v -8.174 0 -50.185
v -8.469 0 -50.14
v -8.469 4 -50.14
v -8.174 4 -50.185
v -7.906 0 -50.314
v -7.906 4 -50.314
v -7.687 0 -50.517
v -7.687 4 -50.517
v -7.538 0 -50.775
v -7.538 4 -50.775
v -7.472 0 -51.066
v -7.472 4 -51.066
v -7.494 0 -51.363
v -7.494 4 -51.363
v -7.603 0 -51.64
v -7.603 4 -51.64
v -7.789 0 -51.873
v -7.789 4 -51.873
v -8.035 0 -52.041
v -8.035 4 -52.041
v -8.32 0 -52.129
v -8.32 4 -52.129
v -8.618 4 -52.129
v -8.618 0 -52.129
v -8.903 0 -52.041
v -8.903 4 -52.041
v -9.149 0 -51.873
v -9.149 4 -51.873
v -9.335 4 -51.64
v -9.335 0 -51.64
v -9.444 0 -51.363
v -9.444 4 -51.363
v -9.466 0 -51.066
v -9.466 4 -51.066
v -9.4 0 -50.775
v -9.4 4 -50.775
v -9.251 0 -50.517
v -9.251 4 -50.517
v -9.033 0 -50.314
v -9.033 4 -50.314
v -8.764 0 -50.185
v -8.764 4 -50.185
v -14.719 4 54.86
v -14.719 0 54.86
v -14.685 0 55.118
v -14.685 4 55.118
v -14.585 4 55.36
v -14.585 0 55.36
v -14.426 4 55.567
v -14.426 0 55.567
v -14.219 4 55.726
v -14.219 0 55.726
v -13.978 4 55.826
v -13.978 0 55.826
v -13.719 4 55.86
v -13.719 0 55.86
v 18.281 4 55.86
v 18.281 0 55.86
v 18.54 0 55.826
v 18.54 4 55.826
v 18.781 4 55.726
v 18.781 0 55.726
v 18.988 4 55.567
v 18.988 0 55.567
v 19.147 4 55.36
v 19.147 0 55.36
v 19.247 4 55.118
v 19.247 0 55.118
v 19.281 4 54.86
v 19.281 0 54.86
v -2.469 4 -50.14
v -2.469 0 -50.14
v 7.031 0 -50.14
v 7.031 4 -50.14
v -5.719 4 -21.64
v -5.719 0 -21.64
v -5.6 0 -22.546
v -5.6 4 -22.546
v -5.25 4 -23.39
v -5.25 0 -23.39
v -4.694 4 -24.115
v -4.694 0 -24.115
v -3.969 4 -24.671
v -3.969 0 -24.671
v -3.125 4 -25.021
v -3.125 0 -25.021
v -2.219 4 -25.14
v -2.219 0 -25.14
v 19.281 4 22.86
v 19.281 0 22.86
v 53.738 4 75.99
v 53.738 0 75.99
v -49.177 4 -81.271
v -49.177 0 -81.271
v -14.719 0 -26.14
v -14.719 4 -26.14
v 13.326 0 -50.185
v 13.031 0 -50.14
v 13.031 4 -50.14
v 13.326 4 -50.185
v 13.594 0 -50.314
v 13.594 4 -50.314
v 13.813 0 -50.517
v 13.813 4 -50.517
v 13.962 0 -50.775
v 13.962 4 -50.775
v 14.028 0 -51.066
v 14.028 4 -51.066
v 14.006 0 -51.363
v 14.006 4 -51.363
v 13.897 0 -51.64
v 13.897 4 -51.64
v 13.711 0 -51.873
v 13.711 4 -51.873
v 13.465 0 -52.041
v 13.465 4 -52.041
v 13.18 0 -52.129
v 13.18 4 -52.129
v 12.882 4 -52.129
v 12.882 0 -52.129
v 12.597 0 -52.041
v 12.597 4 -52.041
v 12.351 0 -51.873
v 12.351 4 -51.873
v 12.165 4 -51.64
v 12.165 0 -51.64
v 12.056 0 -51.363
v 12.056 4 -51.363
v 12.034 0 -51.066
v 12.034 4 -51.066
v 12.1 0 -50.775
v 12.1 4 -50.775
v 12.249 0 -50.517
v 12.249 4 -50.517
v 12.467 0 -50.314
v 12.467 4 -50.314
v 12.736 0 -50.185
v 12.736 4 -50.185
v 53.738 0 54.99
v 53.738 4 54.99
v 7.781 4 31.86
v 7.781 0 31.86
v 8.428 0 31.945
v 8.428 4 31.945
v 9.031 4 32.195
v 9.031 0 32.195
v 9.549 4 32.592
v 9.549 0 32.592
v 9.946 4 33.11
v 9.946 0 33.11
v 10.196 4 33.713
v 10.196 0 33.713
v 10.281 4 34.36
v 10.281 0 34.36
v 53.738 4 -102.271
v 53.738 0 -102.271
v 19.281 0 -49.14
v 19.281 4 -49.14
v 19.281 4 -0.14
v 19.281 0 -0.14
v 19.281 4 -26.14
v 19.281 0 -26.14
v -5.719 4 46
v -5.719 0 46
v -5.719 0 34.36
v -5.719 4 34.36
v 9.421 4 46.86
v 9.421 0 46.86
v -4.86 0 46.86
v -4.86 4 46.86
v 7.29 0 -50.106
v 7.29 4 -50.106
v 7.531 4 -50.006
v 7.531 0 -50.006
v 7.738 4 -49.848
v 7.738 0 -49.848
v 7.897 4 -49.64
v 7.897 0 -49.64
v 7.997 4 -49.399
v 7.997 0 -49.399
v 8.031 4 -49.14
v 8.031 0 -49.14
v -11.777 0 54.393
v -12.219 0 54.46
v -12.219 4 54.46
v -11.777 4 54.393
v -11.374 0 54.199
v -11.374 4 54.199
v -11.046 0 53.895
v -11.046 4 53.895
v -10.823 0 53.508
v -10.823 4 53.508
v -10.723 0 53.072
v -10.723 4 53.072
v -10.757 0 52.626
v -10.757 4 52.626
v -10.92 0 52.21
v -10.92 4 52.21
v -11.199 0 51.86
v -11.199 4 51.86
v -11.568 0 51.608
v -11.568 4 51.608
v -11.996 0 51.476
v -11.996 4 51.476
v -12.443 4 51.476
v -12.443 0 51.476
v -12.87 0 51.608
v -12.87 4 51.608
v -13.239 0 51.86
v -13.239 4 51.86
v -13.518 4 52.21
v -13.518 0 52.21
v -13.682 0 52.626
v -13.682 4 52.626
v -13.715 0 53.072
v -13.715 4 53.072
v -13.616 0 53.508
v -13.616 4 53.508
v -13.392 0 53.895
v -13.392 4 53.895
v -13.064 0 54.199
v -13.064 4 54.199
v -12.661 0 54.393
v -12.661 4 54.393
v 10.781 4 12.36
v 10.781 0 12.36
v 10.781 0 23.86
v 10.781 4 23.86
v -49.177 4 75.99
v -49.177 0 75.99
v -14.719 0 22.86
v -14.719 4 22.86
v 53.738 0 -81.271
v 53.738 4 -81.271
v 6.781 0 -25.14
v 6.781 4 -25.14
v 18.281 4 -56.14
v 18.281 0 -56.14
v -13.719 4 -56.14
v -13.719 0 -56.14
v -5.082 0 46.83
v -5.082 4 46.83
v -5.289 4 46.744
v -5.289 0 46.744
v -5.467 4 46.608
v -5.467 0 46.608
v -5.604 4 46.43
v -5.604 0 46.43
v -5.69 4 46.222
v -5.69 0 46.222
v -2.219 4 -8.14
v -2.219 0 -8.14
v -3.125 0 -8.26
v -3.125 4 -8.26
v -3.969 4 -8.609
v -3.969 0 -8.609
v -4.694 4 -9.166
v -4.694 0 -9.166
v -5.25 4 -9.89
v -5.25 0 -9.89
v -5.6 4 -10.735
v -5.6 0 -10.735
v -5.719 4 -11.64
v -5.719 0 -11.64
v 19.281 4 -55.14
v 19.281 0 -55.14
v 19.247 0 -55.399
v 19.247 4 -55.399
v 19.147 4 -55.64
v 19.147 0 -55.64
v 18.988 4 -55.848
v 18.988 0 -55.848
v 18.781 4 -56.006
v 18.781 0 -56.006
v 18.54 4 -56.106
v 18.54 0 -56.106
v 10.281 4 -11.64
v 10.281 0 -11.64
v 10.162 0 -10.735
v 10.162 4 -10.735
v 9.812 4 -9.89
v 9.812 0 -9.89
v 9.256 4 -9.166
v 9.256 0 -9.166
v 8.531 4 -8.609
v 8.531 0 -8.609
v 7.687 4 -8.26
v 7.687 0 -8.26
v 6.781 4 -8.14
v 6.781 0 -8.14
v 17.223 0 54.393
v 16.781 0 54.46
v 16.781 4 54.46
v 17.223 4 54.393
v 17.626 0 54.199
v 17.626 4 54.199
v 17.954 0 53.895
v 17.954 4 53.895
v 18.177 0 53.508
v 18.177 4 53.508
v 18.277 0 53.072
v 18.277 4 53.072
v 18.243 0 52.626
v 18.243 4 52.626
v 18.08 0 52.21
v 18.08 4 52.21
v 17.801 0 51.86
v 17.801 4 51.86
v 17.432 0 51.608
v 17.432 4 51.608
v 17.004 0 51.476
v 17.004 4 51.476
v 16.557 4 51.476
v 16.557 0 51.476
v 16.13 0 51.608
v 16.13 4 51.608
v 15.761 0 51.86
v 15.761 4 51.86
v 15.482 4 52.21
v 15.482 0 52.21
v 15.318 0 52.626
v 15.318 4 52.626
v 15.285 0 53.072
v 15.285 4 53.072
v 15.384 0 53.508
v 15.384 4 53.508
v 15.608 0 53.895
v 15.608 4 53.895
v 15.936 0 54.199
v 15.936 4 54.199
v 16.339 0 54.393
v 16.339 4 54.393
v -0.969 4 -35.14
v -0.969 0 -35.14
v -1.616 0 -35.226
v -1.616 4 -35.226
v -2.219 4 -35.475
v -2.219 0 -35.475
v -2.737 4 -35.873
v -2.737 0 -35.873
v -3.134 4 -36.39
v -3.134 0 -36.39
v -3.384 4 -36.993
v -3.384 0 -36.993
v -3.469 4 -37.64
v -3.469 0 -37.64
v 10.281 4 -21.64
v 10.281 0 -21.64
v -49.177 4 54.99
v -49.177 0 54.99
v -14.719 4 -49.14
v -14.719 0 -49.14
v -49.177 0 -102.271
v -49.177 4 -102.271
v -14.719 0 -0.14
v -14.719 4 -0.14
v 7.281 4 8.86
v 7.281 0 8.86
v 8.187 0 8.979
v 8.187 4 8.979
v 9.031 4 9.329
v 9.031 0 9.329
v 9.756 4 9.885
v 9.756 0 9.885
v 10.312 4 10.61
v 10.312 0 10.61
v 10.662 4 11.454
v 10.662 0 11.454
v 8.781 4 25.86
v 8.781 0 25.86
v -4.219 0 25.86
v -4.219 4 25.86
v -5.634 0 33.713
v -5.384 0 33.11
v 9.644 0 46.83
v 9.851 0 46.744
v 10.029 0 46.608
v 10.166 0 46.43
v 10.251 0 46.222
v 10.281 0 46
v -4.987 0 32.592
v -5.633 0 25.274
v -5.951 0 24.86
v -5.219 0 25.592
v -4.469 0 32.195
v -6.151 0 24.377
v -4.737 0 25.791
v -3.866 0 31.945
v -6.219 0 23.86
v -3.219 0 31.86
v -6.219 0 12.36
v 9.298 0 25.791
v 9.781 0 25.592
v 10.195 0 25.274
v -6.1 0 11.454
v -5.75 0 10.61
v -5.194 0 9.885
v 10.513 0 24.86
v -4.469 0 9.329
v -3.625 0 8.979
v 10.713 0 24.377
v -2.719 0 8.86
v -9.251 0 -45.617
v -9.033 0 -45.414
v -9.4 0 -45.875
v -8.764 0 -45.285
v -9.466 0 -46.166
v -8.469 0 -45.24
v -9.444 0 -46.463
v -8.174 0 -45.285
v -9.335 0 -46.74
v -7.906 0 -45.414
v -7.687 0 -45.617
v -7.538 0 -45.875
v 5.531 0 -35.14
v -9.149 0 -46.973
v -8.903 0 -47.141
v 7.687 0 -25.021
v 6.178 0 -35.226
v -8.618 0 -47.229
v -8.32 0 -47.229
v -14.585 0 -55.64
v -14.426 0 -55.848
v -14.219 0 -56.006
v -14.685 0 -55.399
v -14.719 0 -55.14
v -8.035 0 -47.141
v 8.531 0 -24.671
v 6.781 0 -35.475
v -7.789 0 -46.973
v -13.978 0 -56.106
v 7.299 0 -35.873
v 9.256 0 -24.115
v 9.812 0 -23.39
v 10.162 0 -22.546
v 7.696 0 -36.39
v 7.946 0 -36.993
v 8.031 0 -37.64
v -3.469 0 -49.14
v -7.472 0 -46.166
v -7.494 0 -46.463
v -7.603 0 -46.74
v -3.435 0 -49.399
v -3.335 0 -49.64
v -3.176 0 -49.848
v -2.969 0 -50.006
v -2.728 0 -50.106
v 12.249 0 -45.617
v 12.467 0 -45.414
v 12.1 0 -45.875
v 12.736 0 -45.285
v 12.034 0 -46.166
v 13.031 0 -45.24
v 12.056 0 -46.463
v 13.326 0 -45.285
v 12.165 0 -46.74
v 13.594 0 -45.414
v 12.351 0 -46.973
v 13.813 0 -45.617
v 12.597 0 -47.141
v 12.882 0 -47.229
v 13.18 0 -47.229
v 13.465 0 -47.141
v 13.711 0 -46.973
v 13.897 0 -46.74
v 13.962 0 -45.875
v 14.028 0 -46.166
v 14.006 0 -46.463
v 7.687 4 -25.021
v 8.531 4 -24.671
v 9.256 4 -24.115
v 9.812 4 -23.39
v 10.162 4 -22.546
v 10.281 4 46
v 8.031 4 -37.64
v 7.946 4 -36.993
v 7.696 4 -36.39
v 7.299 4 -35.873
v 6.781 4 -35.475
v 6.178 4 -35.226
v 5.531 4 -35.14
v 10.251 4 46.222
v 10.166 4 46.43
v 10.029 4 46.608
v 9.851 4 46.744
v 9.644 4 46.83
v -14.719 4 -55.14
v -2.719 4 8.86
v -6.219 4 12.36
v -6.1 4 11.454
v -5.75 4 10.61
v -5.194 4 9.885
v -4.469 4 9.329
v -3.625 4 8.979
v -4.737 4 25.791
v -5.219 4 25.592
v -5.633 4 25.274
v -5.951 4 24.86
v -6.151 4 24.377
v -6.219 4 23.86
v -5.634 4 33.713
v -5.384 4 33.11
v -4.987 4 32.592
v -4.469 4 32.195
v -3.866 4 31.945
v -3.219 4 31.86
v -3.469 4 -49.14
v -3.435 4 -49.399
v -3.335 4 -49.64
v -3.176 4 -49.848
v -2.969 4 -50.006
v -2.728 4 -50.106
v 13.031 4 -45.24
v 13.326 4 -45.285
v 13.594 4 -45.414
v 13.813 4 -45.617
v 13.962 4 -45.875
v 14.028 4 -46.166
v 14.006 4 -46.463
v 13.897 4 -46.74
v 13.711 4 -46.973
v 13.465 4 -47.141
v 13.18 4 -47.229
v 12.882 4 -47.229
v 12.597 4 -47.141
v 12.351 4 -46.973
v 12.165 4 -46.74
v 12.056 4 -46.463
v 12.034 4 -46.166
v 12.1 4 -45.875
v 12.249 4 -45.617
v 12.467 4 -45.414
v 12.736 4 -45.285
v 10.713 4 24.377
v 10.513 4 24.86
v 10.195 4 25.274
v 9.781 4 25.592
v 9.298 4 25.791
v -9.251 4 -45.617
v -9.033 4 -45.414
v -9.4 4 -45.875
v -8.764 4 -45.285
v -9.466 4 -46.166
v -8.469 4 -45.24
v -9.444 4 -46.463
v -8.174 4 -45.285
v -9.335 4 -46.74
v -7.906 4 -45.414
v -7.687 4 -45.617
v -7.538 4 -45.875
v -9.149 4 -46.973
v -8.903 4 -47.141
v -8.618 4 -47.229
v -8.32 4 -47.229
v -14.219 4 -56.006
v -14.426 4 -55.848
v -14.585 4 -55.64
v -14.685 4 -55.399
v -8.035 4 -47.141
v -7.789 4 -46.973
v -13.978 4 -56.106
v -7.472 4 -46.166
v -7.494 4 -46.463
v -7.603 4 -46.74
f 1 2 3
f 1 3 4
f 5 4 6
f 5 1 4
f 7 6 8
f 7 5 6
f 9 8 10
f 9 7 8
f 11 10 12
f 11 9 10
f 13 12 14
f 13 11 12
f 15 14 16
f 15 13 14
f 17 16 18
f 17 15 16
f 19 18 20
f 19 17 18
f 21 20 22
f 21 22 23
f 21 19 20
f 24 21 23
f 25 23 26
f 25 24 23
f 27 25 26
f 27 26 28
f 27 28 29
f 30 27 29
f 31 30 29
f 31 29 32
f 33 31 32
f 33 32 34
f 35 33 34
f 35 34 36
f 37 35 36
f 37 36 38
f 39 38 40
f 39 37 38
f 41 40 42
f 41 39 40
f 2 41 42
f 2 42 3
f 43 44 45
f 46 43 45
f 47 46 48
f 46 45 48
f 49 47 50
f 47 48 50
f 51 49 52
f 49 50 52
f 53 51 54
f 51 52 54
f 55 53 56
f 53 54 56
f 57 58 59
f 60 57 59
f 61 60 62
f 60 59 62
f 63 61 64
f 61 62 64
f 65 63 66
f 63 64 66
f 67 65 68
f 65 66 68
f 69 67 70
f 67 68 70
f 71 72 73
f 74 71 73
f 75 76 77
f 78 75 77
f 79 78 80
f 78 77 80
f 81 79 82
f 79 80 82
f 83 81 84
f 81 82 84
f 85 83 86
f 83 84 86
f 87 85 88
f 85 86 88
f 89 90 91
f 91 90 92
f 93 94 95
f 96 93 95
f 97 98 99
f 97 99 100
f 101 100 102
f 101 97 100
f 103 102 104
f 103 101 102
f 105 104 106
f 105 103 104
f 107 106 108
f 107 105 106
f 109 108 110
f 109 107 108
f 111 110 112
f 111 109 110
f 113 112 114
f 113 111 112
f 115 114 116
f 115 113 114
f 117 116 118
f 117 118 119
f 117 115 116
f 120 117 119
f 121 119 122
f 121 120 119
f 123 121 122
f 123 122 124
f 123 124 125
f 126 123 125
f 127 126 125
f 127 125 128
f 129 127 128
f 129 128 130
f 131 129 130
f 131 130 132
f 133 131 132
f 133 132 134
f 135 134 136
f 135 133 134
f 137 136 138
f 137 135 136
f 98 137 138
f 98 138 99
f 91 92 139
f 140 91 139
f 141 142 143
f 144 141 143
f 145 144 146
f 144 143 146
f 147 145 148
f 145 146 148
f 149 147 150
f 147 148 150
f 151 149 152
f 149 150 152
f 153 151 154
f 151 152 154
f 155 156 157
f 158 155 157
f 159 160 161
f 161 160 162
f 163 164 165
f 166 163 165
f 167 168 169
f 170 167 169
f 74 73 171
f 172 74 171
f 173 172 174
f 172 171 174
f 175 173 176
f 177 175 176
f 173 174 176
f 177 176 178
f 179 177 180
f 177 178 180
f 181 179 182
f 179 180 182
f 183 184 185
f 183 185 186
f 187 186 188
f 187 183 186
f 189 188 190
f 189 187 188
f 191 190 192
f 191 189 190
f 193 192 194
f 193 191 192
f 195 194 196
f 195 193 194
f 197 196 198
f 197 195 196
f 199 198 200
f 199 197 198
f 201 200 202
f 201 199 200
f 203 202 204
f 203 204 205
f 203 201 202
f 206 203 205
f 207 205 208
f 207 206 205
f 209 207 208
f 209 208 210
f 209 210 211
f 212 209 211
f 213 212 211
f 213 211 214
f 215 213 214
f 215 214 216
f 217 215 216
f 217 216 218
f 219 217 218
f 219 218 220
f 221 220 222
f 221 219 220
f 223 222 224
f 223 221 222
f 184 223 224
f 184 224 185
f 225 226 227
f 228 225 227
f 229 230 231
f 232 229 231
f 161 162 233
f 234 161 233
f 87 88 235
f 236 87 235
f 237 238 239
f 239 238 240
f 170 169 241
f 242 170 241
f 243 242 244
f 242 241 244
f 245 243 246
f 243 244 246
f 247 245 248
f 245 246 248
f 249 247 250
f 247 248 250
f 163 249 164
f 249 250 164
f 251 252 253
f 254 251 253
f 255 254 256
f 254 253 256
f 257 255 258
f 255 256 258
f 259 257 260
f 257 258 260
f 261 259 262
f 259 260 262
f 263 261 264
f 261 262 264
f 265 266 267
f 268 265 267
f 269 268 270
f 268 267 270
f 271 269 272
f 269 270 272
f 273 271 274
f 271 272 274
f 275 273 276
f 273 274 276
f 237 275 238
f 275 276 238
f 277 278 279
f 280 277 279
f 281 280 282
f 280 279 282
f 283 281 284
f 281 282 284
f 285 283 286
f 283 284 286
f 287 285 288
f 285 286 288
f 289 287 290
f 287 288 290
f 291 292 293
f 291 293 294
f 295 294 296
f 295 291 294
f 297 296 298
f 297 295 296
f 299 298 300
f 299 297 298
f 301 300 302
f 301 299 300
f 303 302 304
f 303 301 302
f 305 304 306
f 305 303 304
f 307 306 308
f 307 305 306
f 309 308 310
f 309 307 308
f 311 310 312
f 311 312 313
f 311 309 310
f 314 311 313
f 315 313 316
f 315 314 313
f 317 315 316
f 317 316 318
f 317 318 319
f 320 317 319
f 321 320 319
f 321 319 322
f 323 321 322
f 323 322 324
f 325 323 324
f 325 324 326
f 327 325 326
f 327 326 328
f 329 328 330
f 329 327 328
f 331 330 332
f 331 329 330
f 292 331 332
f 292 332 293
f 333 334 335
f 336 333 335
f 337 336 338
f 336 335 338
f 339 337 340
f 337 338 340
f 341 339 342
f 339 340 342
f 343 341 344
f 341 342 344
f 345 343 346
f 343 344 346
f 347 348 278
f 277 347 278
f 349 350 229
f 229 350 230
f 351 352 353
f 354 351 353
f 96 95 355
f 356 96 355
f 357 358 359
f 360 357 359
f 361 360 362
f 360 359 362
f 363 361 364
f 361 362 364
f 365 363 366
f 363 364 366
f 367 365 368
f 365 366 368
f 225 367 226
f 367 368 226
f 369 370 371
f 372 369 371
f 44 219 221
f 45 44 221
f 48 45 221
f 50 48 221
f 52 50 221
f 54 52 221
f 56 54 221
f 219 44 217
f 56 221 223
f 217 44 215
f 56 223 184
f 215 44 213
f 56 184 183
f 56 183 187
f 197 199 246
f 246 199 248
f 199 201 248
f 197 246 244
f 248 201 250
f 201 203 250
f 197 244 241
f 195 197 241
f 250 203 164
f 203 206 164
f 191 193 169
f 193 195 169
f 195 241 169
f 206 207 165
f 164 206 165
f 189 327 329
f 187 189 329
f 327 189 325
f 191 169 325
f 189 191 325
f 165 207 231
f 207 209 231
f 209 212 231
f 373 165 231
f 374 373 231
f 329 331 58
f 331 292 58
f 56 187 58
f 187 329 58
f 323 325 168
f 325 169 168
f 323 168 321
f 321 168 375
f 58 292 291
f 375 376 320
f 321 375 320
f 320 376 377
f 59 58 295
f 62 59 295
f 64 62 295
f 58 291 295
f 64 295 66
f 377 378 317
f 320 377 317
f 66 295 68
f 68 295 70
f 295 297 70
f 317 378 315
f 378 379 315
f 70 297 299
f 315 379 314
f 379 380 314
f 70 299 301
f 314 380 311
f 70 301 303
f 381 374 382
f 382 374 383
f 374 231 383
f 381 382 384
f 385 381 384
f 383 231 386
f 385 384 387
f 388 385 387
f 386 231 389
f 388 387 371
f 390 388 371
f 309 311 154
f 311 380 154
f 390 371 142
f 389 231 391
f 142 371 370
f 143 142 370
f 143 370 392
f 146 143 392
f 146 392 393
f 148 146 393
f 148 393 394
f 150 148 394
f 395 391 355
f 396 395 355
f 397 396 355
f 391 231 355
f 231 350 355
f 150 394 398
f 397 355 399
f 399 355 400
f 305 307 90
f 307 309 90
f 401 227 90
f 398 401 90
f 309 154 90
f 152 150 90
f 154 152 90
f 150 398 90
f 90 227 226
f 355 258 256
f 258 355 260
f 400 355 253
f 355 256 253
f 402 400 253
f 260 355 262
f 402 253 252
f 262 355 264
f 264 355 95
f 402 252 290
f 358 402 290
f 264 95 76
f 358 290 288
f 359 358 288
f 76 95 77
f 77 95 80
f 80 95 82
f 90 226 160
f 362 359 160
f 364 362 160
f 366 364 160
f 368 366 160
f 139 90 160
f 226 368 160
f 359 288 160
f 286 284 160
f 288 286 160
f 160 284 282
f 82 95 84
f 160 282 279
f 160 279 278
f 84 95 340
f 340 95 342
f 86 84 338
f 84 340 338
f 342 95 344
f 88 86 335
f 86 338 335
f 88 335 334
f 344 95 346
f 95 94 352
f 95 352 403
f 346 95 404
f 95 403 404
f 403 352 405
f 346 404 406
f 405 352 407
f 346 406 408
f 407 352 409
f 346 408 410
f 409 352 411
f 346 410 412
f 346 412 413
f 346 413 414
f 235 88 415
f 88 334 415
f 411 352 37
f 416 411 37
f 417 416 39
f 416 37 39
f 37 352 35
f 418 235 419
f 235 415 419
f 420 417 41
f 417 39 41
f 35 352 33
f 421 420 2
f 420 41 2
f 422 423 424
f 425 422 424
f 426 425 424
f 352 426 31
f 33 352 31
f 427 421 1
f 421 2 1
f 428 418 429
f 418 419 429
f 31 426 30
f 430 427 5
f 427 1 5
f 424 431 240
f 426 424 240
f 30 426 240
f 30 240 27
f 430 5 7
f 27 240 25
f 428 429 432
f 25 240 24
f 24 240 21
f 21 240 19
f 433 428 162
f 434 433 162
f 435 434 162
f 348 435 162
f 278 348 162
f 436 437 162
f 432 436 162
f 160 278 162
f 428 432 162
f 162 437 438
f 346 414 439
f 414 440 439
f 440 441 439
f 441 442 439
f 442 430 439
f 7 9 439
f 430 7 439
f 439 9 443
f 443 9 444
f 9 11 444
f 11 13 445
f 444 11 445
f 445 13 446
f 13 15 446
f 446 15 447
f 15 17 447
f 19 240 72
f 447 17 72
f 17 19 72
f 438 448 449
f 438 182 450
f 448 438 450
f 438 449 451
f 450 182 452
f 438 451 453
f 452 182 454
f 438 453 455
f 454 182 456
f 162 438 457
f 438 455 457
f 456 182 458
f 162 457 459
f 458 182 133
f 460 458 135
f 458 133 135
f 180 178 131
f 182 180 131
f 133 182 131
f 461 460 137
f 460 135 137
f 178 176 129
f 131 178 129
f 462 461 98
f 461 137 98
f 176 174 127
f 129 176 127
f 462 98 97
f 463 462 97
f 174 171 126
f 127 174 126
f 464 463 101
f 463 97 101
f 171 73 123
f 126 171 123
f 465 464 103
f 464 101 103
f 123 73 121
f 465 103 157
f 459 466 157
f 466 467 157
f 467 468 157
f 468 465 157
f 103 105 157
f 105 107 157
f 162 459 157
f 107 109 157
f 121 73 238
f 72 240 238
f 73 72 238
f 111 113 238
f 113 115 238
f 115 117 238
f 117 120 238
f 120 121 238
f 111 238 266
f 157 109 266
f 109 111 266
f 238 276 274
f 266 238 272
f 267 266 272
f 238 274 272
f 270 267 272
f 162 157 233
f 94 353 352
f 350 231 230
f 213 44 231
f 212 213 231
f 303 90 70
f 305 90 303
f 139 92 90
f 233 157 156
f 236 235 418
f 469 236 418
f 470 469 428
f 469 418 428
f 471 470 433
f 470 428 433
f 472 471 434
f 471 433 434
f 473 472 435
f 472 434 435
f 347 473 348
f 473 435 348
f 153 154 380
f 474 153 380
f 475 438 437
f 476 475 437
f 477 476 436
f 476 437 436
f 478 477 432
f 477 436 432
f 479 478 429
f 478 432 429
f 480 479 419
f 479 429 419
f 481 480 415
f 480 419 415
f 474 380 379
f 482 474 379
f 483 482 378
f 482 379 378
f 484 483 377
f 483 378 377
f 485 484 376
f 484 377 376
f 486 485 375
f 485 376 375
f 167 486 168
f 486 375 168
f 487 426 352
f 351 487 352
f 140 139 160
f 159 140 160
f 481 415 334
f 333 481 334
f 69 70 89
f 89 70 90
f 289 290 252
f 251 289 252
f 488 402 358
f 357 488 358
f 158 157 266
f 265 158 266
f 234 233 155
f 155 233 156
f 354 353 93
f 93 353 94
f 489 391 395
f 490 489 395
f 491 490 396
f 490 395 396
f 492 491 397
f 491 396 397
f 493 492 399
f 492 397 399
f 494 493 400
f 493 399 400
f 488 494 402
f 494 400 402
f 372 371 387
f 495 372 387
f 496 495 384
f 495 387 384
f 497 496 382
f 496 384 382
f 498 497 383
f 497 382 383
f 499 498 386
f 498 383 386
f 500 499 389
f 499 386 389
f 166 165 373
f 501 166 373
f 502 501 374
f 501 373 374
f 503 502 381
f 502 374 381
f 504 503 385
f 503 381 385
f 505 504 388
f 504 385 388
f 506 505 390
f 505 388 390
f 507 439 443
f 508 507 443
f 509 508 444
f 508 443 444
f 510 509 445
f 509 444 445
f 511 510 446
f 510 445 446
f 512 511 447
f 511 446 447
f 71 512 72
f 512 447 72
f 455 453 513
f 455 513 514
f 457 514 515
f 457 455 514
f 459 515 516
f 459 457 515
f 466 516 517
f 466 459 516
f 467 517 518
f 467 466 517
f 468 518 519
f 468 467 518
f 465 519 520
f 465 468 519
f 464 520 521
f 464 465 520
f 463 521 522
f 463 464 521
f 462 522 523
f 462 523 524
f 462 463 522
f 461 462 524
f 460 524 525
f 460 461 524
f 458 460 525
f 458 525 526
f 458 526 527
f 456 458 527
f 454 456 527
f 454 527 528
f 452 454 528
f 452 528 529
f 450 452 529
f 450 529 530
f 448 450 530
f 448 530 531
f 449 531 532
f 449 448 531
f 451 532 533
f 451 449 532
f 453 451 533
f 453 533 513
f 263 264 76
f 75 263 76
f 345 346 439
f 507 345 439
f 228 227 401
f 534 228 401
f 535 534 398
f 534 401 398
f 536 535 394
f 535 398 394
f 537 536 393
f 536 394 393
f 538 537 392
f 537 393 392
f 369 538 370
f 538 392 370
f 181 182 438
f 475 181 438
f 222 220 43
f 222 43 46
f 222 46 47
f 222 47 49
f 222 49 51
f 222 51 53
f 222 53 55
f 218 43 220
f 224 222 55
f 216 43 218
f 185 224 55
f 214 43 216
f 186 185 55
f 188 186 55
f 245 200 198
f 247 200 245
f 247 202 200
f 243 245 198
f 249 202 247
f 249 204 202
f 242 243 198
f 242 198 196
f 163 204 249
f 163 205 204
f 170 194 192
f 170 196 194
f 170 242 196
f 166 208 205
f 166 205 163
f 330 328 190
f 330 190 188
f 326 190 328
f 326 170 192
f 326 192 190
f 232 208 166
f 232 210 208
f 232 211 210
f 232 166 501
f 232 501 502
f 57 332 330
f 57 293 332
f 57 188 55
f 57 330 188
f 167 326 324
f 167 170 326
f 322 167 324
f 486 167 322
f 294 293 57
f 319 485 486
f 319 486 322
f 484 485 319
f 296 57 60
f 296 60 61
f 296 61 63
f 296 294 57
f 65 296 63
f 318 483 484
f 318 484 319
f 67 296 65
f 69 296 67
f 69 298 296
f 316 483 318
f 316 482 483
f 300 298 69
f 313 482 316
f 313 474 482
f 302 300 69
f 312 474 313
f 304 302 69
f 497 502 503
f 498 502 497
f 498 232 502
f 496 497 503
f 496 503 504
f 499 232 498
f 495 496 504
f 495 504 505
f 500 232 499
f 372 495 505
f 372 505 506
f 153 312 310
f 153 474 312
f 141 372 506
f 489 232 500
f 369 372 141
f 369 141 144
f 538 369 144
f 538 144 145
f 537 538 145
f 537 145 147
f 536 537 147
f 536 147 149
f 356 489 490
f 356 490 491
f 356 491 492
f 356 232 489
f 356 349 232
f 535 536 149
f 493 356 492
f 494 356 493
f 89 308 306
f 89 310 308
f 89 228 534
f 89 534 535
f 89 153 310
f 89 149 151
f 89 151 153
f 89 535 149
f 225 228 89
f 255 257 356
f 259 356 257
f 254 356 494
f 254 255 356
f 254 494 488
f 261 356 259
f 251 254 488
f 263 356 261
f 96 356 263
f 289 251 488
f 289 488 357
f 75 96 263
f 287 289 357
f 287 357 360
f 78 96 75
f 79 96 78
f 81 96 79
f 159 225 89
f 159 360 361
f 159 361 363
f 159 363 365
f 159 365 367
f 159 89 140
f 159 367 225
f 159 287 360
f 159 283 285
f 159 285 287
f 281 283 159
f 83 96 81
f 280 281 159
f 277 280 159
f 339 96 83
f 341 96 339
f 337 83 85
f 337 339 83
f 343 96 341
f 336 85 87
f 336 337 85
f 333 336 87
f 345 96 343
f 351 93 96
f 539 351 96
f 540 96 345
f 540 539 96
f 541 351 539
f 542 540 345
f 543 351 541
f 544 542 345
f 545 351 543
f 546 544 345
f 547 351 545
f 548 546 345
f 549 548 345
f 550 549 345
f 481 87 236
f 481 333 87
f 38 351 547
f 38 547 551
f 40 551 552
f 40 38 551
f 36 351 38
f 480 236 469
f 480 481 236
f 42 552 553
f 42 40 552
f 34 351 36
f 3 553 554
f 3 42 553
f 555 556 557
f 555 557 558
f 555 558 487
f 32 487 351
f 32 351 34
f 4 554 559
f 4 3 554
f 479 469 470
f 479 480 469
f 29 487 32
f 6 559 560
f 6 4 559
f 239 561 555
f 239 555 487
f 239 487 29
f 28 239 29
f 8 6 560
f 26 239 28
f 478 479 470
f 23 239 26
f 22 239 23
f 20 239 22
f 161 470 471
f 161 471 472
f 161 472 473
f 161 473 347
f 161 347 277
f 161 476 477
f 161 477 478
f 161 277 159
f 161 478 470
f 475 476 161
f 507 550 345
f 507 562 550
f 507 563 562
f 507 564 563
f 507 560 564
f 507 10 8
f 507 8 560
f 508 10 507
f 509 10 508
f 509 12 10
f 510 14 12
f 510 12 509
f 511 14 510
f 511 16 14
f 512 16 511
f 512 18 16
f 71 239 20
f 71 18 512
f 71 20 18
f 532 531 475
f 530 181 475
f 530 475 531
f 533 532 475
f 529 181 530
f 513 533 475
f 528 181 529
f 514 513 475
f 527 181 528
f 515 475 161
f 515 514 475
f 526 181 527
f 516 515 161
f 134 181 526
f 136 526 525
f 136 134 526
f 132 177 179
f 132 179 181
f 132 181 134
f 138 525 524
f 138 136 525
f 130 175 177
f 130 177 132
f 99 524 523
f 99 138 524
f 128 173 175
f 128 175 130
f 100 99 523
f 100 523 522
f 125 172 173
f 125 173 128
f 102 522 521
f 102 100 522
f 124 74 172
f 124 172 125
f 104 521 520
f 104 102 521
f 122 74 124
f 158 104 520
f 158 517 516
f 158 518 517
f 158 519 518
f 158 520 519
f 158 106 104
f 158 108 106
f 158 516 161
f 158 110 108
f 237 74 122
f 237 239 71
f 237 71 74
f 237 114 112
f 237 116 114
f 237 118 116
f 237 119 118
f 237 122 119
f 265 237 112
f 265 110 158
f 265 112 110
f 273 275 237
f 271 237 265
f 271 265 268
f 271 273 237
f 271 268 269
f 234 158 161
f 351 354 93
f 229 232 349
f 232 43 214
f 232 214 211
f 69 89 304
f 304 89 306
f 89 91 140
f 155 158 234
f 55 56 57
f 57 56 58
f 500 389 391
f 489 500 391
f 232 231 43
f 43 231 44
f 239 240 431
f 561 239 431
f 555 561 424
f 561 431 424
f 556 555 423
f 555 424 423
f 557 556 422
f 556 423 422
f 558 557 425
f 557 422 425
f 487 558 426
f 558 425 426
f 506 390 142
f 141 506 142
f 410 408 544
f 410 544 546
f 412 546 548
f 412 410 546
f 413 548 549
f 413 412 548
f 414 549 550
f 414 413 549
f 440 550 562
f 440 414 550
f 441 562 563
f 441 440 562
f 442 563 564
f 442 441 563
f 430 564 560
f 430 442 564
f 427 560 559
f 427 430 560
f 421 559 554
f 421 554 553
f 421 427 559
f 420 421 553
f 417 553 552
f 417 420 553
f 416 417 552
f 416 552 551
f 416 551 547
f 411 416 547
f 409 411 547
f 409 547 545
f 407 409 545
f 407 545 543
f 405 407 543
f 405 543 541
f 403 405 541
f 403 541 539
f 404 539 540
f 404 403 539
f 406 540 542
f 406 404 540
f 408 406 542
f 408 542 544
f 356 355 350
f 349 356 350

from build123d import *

# Parameters (mm, degrees)
FRAME_SKETCH_R           = 1.5
FRAME_SKETCH_R_2         = 1
FRAME_BOTTOM_PLATE_DEPTH = 4


with BuildPart() as part:
    # Frame Sketch → Frame Bottom Plate (new body)
    with BuildSketch(Plane(origin=(0, 0, 0), x_dir=(1, 0, 0), z_dir=(0, 1, 0))):
        with BuildLine():
            Line((18.280787571, 56.140393786), (-13.719212429, 56.140393786))
            ThreePointArc((-13.719212429, 56.140393786), (-14.42631921, 55.847500567), (-14.719212429, 55.140393786))
            Line((-14.719212429, 55.140393786), (-14.719212429, 49.140393786))
            Line((-14.719212429, 49.140393786), (-49.176727046, 102.27090579))
            Line((-49.176727046, 102.27090579), (-49.176727046, 81.27090579))
            Line((-49.176727046, 81.27090579), (-14.719212429, 26.140393786))
            Line((-14.719212429, 26.140393786), (-14.719212429, 0.140393786))
            Line((-14.719212429, 0.140393786), (-49.176727046, -54.990118218))
            Line((-49.176727046, -54.990118218), (-49.176727046, -75.990118218))
            Line((-49.176727046, -75.990118218), (-14.719212429, -22.859606214))
            Line((-14.719212429, -22.859606214), (-14.719212429, -54.859606214))
            ThreePointArc((-14.719212429, -54.859606214), (-14.42631921, -55.566712995), (-13.719212429, -55.859606214))
            Line((-13.719212429, -55.859606214), (18.280787571, -55.859606214))
            ThreePointArc((18.280787571, -55.859606214), (18.987894353, -55.566712995), (19.280787571, -54.859606214))
            Line((19.280787571, -54.859606214), (19.280787571, -22.859606214))
            Line((19.280787571, -22.859606214), (53.738302189, -75.990118218))
            Line((53.738302189, -75.990118218), (53.738302189, -54.990118218))
            Line((53.738302189, -54.990118218), (19.280787571, 0.140393786))
            Line((19.280787571, 0.140393786), (19.280787571, 26.140393786))
            Line((19.280787571, 26.140393786), (53.738302189, 81.27090579))
            Line((53.738302189, 81.27090579), (53.738302189, 102.27090579))
            Line((53.738302189, 102.27090579), (19.280787571, 49.140393786))
            Line((19.280787571, 49.140393786), (19.280787571, 55.140393786))
            ThreePointArc((19.280787571, 55.140393786), (18.987894353, 55.847500567), (18.280787571, 56.140393786))
        make_face()
        with Locations(Location((-12.219212429, -52.959606214, 0), (0, 0, 270))):
            Circle(FRAME_SKETCH_R, mode=Mode.SUBTRACT)
        with BuildLine():
            Line((9.421181357, -46.859606214), (-4.859606214, -46.859606214))
            ThreePointArc((-4.859606214, -46.859606214), (-5.467439598, -46.607833383), (-5.719212429, -46))
            Line((-5.719212429, -46), (-5.719212429, -34.359606214))
            ThreePointArc((-5.719212429, -34.359606214), (-4.986979382, -32.591839261), (-3.219212429, -31.859606214))
            Line((-3.219212429, -31.859606214), (7.780787571, -31.859606214))
            ThreePointArc((7.780787571, -31.859606214), (9.548554524, -32.591839261), (10.280787571, -34.359606214))
            Line((10.280787571, -34.359606214), (10.280787571, -46))
            ThreePointArc((10.280787571, -46), (10.02901474, -46.607833383), (9.421181357, -46.859606214))
        make_face(mode=Mode.SUBTRACT)
        with Locations(Location((16.780787571, -52.959606214, 0), (0, 0, 270))):
            Circle(FRAME_SKETCH_R, mode=Mode.SUBTRACT)
        with BuildLine():
            ThreePointArc((10.780787571, -23.859606214), (10.195001134, -25.273819777), (8.780787571, -25.859606214))
            Line((8.780787571, -25.859606214), (-4.219212429, -25.859606214))
            ThreePointArc((-4.219212429, -25.859606214), (-5.633425991, -25.273819777), (-6.219212429, -23.859606214))
            Line((-6.219212429, -23.859606214), (-6.219212429, -12.359606214))
            ThreePointArc((-6.219212429, -12.359606214), (-5.194086163, -9.88473248), (-2.719212429, -8.859606214))
            Line((-2.719212429, -8.859606214), (7.280787571, -8.859606214))
            ThreePointArc((7.280787571, -8.859606214), (9.755661306, -9.88473248), (10.780787571, -12.359606214))
            Line((10.780787571, -12.359606214), (10.780787571, -23.859606214))
        make_face(mode=Mode.SUBTRACT)
        with BuildLine():
            Line((6.780787571, 8.140393786), (-2.219212429, 8.140393786))
            ThreePointArc((-2.219212429, 8.140393786), (-4.694086163, 9.165520052), (-5.719212429, 11.640393786))
            Line((-5.719212429, 11.640393786), (-5.719212429, 21.640393786))
            ThreePointArc((-5.719212429, 21.640393786), (-4.694086163, 24.11526752), (-2.219212429, 25.140393786))
            Line((-2.219212429, 25.140393786), (6.780787571, 25.140393786))
            ThreePointArc((6.780787571, 25.140393786), (9.255661306, 24.11526752), (10.280787571, 21.640393786))
            Line((10.280787571, 21.640393786), (10.280787571, 11.640393786))
            ThreePointArc((10.280787571, 11.640393786), (9.255661306, 9.165520052), (6.780787571, 8.140393786))
        make_face(mode=Mode.SUBTRACT)
        with Locations(Location((-8.469212429, 46.240393786, 0), (0, 0, 270))):
            Circle(FRAME_SKETCH_R_2, mode=Mode.SUBTRACT)
        with BuildLine():
            Line((5.530787571, 35.140393786), (-0.969212429, 35.140393786))
            ThreePointArc((-0.969212429, 35.140393786), (-2.736979382, 35.872626833), (-3.469212429, 37.640393786))
            Line((-3.469212429, 37.640393786), (-3.469212429, 49.140393786))
            ThreePointArc((-3.469212429, 49.140393786), (-3.17631921, 49.847500567), (-2.469212429, 50.140393786))
            Line((-2.469212429, 50.140393786), (7.030787571, 50.140393786))
            ThreePointArc((7.030787571, 50.140393786), (7.737894353, 49.847500567), (8.030787571, 49.140393786))
            Line((8.030787571, 49.140393786), (8.030787571, 37.640393786))
            ThreePointArc((8.030787571, 37.640393786), (7.298554524, 35.872626833), (5.530787571, 35.140393786))
        make_face(mode=Mode.SUBTRACT)
        with Locations(Location((-8.469212429, 51.140393786, 0), (0, 0, 270))):
            Circle(FRAME_SKETCH_R_2, mode=Mode.SUBTRACT)
        with Locations(Location((13.030787571, 46.240393786, 0), (0, 0, 270))):
            Circle(FRAME_SKETCH_R_2, mode=Mode.SUBTRACT)
        with Locations(Location((13.030787571, 51.140393786, 0), (0, 0, 270))):
            Circle(FRAME_SKETCH_R_2, mode=Mode.SUBTRACT)
    extrude(amount=FRAME_BOTTOM_PLATE_DEPTH)


solid = part.part
